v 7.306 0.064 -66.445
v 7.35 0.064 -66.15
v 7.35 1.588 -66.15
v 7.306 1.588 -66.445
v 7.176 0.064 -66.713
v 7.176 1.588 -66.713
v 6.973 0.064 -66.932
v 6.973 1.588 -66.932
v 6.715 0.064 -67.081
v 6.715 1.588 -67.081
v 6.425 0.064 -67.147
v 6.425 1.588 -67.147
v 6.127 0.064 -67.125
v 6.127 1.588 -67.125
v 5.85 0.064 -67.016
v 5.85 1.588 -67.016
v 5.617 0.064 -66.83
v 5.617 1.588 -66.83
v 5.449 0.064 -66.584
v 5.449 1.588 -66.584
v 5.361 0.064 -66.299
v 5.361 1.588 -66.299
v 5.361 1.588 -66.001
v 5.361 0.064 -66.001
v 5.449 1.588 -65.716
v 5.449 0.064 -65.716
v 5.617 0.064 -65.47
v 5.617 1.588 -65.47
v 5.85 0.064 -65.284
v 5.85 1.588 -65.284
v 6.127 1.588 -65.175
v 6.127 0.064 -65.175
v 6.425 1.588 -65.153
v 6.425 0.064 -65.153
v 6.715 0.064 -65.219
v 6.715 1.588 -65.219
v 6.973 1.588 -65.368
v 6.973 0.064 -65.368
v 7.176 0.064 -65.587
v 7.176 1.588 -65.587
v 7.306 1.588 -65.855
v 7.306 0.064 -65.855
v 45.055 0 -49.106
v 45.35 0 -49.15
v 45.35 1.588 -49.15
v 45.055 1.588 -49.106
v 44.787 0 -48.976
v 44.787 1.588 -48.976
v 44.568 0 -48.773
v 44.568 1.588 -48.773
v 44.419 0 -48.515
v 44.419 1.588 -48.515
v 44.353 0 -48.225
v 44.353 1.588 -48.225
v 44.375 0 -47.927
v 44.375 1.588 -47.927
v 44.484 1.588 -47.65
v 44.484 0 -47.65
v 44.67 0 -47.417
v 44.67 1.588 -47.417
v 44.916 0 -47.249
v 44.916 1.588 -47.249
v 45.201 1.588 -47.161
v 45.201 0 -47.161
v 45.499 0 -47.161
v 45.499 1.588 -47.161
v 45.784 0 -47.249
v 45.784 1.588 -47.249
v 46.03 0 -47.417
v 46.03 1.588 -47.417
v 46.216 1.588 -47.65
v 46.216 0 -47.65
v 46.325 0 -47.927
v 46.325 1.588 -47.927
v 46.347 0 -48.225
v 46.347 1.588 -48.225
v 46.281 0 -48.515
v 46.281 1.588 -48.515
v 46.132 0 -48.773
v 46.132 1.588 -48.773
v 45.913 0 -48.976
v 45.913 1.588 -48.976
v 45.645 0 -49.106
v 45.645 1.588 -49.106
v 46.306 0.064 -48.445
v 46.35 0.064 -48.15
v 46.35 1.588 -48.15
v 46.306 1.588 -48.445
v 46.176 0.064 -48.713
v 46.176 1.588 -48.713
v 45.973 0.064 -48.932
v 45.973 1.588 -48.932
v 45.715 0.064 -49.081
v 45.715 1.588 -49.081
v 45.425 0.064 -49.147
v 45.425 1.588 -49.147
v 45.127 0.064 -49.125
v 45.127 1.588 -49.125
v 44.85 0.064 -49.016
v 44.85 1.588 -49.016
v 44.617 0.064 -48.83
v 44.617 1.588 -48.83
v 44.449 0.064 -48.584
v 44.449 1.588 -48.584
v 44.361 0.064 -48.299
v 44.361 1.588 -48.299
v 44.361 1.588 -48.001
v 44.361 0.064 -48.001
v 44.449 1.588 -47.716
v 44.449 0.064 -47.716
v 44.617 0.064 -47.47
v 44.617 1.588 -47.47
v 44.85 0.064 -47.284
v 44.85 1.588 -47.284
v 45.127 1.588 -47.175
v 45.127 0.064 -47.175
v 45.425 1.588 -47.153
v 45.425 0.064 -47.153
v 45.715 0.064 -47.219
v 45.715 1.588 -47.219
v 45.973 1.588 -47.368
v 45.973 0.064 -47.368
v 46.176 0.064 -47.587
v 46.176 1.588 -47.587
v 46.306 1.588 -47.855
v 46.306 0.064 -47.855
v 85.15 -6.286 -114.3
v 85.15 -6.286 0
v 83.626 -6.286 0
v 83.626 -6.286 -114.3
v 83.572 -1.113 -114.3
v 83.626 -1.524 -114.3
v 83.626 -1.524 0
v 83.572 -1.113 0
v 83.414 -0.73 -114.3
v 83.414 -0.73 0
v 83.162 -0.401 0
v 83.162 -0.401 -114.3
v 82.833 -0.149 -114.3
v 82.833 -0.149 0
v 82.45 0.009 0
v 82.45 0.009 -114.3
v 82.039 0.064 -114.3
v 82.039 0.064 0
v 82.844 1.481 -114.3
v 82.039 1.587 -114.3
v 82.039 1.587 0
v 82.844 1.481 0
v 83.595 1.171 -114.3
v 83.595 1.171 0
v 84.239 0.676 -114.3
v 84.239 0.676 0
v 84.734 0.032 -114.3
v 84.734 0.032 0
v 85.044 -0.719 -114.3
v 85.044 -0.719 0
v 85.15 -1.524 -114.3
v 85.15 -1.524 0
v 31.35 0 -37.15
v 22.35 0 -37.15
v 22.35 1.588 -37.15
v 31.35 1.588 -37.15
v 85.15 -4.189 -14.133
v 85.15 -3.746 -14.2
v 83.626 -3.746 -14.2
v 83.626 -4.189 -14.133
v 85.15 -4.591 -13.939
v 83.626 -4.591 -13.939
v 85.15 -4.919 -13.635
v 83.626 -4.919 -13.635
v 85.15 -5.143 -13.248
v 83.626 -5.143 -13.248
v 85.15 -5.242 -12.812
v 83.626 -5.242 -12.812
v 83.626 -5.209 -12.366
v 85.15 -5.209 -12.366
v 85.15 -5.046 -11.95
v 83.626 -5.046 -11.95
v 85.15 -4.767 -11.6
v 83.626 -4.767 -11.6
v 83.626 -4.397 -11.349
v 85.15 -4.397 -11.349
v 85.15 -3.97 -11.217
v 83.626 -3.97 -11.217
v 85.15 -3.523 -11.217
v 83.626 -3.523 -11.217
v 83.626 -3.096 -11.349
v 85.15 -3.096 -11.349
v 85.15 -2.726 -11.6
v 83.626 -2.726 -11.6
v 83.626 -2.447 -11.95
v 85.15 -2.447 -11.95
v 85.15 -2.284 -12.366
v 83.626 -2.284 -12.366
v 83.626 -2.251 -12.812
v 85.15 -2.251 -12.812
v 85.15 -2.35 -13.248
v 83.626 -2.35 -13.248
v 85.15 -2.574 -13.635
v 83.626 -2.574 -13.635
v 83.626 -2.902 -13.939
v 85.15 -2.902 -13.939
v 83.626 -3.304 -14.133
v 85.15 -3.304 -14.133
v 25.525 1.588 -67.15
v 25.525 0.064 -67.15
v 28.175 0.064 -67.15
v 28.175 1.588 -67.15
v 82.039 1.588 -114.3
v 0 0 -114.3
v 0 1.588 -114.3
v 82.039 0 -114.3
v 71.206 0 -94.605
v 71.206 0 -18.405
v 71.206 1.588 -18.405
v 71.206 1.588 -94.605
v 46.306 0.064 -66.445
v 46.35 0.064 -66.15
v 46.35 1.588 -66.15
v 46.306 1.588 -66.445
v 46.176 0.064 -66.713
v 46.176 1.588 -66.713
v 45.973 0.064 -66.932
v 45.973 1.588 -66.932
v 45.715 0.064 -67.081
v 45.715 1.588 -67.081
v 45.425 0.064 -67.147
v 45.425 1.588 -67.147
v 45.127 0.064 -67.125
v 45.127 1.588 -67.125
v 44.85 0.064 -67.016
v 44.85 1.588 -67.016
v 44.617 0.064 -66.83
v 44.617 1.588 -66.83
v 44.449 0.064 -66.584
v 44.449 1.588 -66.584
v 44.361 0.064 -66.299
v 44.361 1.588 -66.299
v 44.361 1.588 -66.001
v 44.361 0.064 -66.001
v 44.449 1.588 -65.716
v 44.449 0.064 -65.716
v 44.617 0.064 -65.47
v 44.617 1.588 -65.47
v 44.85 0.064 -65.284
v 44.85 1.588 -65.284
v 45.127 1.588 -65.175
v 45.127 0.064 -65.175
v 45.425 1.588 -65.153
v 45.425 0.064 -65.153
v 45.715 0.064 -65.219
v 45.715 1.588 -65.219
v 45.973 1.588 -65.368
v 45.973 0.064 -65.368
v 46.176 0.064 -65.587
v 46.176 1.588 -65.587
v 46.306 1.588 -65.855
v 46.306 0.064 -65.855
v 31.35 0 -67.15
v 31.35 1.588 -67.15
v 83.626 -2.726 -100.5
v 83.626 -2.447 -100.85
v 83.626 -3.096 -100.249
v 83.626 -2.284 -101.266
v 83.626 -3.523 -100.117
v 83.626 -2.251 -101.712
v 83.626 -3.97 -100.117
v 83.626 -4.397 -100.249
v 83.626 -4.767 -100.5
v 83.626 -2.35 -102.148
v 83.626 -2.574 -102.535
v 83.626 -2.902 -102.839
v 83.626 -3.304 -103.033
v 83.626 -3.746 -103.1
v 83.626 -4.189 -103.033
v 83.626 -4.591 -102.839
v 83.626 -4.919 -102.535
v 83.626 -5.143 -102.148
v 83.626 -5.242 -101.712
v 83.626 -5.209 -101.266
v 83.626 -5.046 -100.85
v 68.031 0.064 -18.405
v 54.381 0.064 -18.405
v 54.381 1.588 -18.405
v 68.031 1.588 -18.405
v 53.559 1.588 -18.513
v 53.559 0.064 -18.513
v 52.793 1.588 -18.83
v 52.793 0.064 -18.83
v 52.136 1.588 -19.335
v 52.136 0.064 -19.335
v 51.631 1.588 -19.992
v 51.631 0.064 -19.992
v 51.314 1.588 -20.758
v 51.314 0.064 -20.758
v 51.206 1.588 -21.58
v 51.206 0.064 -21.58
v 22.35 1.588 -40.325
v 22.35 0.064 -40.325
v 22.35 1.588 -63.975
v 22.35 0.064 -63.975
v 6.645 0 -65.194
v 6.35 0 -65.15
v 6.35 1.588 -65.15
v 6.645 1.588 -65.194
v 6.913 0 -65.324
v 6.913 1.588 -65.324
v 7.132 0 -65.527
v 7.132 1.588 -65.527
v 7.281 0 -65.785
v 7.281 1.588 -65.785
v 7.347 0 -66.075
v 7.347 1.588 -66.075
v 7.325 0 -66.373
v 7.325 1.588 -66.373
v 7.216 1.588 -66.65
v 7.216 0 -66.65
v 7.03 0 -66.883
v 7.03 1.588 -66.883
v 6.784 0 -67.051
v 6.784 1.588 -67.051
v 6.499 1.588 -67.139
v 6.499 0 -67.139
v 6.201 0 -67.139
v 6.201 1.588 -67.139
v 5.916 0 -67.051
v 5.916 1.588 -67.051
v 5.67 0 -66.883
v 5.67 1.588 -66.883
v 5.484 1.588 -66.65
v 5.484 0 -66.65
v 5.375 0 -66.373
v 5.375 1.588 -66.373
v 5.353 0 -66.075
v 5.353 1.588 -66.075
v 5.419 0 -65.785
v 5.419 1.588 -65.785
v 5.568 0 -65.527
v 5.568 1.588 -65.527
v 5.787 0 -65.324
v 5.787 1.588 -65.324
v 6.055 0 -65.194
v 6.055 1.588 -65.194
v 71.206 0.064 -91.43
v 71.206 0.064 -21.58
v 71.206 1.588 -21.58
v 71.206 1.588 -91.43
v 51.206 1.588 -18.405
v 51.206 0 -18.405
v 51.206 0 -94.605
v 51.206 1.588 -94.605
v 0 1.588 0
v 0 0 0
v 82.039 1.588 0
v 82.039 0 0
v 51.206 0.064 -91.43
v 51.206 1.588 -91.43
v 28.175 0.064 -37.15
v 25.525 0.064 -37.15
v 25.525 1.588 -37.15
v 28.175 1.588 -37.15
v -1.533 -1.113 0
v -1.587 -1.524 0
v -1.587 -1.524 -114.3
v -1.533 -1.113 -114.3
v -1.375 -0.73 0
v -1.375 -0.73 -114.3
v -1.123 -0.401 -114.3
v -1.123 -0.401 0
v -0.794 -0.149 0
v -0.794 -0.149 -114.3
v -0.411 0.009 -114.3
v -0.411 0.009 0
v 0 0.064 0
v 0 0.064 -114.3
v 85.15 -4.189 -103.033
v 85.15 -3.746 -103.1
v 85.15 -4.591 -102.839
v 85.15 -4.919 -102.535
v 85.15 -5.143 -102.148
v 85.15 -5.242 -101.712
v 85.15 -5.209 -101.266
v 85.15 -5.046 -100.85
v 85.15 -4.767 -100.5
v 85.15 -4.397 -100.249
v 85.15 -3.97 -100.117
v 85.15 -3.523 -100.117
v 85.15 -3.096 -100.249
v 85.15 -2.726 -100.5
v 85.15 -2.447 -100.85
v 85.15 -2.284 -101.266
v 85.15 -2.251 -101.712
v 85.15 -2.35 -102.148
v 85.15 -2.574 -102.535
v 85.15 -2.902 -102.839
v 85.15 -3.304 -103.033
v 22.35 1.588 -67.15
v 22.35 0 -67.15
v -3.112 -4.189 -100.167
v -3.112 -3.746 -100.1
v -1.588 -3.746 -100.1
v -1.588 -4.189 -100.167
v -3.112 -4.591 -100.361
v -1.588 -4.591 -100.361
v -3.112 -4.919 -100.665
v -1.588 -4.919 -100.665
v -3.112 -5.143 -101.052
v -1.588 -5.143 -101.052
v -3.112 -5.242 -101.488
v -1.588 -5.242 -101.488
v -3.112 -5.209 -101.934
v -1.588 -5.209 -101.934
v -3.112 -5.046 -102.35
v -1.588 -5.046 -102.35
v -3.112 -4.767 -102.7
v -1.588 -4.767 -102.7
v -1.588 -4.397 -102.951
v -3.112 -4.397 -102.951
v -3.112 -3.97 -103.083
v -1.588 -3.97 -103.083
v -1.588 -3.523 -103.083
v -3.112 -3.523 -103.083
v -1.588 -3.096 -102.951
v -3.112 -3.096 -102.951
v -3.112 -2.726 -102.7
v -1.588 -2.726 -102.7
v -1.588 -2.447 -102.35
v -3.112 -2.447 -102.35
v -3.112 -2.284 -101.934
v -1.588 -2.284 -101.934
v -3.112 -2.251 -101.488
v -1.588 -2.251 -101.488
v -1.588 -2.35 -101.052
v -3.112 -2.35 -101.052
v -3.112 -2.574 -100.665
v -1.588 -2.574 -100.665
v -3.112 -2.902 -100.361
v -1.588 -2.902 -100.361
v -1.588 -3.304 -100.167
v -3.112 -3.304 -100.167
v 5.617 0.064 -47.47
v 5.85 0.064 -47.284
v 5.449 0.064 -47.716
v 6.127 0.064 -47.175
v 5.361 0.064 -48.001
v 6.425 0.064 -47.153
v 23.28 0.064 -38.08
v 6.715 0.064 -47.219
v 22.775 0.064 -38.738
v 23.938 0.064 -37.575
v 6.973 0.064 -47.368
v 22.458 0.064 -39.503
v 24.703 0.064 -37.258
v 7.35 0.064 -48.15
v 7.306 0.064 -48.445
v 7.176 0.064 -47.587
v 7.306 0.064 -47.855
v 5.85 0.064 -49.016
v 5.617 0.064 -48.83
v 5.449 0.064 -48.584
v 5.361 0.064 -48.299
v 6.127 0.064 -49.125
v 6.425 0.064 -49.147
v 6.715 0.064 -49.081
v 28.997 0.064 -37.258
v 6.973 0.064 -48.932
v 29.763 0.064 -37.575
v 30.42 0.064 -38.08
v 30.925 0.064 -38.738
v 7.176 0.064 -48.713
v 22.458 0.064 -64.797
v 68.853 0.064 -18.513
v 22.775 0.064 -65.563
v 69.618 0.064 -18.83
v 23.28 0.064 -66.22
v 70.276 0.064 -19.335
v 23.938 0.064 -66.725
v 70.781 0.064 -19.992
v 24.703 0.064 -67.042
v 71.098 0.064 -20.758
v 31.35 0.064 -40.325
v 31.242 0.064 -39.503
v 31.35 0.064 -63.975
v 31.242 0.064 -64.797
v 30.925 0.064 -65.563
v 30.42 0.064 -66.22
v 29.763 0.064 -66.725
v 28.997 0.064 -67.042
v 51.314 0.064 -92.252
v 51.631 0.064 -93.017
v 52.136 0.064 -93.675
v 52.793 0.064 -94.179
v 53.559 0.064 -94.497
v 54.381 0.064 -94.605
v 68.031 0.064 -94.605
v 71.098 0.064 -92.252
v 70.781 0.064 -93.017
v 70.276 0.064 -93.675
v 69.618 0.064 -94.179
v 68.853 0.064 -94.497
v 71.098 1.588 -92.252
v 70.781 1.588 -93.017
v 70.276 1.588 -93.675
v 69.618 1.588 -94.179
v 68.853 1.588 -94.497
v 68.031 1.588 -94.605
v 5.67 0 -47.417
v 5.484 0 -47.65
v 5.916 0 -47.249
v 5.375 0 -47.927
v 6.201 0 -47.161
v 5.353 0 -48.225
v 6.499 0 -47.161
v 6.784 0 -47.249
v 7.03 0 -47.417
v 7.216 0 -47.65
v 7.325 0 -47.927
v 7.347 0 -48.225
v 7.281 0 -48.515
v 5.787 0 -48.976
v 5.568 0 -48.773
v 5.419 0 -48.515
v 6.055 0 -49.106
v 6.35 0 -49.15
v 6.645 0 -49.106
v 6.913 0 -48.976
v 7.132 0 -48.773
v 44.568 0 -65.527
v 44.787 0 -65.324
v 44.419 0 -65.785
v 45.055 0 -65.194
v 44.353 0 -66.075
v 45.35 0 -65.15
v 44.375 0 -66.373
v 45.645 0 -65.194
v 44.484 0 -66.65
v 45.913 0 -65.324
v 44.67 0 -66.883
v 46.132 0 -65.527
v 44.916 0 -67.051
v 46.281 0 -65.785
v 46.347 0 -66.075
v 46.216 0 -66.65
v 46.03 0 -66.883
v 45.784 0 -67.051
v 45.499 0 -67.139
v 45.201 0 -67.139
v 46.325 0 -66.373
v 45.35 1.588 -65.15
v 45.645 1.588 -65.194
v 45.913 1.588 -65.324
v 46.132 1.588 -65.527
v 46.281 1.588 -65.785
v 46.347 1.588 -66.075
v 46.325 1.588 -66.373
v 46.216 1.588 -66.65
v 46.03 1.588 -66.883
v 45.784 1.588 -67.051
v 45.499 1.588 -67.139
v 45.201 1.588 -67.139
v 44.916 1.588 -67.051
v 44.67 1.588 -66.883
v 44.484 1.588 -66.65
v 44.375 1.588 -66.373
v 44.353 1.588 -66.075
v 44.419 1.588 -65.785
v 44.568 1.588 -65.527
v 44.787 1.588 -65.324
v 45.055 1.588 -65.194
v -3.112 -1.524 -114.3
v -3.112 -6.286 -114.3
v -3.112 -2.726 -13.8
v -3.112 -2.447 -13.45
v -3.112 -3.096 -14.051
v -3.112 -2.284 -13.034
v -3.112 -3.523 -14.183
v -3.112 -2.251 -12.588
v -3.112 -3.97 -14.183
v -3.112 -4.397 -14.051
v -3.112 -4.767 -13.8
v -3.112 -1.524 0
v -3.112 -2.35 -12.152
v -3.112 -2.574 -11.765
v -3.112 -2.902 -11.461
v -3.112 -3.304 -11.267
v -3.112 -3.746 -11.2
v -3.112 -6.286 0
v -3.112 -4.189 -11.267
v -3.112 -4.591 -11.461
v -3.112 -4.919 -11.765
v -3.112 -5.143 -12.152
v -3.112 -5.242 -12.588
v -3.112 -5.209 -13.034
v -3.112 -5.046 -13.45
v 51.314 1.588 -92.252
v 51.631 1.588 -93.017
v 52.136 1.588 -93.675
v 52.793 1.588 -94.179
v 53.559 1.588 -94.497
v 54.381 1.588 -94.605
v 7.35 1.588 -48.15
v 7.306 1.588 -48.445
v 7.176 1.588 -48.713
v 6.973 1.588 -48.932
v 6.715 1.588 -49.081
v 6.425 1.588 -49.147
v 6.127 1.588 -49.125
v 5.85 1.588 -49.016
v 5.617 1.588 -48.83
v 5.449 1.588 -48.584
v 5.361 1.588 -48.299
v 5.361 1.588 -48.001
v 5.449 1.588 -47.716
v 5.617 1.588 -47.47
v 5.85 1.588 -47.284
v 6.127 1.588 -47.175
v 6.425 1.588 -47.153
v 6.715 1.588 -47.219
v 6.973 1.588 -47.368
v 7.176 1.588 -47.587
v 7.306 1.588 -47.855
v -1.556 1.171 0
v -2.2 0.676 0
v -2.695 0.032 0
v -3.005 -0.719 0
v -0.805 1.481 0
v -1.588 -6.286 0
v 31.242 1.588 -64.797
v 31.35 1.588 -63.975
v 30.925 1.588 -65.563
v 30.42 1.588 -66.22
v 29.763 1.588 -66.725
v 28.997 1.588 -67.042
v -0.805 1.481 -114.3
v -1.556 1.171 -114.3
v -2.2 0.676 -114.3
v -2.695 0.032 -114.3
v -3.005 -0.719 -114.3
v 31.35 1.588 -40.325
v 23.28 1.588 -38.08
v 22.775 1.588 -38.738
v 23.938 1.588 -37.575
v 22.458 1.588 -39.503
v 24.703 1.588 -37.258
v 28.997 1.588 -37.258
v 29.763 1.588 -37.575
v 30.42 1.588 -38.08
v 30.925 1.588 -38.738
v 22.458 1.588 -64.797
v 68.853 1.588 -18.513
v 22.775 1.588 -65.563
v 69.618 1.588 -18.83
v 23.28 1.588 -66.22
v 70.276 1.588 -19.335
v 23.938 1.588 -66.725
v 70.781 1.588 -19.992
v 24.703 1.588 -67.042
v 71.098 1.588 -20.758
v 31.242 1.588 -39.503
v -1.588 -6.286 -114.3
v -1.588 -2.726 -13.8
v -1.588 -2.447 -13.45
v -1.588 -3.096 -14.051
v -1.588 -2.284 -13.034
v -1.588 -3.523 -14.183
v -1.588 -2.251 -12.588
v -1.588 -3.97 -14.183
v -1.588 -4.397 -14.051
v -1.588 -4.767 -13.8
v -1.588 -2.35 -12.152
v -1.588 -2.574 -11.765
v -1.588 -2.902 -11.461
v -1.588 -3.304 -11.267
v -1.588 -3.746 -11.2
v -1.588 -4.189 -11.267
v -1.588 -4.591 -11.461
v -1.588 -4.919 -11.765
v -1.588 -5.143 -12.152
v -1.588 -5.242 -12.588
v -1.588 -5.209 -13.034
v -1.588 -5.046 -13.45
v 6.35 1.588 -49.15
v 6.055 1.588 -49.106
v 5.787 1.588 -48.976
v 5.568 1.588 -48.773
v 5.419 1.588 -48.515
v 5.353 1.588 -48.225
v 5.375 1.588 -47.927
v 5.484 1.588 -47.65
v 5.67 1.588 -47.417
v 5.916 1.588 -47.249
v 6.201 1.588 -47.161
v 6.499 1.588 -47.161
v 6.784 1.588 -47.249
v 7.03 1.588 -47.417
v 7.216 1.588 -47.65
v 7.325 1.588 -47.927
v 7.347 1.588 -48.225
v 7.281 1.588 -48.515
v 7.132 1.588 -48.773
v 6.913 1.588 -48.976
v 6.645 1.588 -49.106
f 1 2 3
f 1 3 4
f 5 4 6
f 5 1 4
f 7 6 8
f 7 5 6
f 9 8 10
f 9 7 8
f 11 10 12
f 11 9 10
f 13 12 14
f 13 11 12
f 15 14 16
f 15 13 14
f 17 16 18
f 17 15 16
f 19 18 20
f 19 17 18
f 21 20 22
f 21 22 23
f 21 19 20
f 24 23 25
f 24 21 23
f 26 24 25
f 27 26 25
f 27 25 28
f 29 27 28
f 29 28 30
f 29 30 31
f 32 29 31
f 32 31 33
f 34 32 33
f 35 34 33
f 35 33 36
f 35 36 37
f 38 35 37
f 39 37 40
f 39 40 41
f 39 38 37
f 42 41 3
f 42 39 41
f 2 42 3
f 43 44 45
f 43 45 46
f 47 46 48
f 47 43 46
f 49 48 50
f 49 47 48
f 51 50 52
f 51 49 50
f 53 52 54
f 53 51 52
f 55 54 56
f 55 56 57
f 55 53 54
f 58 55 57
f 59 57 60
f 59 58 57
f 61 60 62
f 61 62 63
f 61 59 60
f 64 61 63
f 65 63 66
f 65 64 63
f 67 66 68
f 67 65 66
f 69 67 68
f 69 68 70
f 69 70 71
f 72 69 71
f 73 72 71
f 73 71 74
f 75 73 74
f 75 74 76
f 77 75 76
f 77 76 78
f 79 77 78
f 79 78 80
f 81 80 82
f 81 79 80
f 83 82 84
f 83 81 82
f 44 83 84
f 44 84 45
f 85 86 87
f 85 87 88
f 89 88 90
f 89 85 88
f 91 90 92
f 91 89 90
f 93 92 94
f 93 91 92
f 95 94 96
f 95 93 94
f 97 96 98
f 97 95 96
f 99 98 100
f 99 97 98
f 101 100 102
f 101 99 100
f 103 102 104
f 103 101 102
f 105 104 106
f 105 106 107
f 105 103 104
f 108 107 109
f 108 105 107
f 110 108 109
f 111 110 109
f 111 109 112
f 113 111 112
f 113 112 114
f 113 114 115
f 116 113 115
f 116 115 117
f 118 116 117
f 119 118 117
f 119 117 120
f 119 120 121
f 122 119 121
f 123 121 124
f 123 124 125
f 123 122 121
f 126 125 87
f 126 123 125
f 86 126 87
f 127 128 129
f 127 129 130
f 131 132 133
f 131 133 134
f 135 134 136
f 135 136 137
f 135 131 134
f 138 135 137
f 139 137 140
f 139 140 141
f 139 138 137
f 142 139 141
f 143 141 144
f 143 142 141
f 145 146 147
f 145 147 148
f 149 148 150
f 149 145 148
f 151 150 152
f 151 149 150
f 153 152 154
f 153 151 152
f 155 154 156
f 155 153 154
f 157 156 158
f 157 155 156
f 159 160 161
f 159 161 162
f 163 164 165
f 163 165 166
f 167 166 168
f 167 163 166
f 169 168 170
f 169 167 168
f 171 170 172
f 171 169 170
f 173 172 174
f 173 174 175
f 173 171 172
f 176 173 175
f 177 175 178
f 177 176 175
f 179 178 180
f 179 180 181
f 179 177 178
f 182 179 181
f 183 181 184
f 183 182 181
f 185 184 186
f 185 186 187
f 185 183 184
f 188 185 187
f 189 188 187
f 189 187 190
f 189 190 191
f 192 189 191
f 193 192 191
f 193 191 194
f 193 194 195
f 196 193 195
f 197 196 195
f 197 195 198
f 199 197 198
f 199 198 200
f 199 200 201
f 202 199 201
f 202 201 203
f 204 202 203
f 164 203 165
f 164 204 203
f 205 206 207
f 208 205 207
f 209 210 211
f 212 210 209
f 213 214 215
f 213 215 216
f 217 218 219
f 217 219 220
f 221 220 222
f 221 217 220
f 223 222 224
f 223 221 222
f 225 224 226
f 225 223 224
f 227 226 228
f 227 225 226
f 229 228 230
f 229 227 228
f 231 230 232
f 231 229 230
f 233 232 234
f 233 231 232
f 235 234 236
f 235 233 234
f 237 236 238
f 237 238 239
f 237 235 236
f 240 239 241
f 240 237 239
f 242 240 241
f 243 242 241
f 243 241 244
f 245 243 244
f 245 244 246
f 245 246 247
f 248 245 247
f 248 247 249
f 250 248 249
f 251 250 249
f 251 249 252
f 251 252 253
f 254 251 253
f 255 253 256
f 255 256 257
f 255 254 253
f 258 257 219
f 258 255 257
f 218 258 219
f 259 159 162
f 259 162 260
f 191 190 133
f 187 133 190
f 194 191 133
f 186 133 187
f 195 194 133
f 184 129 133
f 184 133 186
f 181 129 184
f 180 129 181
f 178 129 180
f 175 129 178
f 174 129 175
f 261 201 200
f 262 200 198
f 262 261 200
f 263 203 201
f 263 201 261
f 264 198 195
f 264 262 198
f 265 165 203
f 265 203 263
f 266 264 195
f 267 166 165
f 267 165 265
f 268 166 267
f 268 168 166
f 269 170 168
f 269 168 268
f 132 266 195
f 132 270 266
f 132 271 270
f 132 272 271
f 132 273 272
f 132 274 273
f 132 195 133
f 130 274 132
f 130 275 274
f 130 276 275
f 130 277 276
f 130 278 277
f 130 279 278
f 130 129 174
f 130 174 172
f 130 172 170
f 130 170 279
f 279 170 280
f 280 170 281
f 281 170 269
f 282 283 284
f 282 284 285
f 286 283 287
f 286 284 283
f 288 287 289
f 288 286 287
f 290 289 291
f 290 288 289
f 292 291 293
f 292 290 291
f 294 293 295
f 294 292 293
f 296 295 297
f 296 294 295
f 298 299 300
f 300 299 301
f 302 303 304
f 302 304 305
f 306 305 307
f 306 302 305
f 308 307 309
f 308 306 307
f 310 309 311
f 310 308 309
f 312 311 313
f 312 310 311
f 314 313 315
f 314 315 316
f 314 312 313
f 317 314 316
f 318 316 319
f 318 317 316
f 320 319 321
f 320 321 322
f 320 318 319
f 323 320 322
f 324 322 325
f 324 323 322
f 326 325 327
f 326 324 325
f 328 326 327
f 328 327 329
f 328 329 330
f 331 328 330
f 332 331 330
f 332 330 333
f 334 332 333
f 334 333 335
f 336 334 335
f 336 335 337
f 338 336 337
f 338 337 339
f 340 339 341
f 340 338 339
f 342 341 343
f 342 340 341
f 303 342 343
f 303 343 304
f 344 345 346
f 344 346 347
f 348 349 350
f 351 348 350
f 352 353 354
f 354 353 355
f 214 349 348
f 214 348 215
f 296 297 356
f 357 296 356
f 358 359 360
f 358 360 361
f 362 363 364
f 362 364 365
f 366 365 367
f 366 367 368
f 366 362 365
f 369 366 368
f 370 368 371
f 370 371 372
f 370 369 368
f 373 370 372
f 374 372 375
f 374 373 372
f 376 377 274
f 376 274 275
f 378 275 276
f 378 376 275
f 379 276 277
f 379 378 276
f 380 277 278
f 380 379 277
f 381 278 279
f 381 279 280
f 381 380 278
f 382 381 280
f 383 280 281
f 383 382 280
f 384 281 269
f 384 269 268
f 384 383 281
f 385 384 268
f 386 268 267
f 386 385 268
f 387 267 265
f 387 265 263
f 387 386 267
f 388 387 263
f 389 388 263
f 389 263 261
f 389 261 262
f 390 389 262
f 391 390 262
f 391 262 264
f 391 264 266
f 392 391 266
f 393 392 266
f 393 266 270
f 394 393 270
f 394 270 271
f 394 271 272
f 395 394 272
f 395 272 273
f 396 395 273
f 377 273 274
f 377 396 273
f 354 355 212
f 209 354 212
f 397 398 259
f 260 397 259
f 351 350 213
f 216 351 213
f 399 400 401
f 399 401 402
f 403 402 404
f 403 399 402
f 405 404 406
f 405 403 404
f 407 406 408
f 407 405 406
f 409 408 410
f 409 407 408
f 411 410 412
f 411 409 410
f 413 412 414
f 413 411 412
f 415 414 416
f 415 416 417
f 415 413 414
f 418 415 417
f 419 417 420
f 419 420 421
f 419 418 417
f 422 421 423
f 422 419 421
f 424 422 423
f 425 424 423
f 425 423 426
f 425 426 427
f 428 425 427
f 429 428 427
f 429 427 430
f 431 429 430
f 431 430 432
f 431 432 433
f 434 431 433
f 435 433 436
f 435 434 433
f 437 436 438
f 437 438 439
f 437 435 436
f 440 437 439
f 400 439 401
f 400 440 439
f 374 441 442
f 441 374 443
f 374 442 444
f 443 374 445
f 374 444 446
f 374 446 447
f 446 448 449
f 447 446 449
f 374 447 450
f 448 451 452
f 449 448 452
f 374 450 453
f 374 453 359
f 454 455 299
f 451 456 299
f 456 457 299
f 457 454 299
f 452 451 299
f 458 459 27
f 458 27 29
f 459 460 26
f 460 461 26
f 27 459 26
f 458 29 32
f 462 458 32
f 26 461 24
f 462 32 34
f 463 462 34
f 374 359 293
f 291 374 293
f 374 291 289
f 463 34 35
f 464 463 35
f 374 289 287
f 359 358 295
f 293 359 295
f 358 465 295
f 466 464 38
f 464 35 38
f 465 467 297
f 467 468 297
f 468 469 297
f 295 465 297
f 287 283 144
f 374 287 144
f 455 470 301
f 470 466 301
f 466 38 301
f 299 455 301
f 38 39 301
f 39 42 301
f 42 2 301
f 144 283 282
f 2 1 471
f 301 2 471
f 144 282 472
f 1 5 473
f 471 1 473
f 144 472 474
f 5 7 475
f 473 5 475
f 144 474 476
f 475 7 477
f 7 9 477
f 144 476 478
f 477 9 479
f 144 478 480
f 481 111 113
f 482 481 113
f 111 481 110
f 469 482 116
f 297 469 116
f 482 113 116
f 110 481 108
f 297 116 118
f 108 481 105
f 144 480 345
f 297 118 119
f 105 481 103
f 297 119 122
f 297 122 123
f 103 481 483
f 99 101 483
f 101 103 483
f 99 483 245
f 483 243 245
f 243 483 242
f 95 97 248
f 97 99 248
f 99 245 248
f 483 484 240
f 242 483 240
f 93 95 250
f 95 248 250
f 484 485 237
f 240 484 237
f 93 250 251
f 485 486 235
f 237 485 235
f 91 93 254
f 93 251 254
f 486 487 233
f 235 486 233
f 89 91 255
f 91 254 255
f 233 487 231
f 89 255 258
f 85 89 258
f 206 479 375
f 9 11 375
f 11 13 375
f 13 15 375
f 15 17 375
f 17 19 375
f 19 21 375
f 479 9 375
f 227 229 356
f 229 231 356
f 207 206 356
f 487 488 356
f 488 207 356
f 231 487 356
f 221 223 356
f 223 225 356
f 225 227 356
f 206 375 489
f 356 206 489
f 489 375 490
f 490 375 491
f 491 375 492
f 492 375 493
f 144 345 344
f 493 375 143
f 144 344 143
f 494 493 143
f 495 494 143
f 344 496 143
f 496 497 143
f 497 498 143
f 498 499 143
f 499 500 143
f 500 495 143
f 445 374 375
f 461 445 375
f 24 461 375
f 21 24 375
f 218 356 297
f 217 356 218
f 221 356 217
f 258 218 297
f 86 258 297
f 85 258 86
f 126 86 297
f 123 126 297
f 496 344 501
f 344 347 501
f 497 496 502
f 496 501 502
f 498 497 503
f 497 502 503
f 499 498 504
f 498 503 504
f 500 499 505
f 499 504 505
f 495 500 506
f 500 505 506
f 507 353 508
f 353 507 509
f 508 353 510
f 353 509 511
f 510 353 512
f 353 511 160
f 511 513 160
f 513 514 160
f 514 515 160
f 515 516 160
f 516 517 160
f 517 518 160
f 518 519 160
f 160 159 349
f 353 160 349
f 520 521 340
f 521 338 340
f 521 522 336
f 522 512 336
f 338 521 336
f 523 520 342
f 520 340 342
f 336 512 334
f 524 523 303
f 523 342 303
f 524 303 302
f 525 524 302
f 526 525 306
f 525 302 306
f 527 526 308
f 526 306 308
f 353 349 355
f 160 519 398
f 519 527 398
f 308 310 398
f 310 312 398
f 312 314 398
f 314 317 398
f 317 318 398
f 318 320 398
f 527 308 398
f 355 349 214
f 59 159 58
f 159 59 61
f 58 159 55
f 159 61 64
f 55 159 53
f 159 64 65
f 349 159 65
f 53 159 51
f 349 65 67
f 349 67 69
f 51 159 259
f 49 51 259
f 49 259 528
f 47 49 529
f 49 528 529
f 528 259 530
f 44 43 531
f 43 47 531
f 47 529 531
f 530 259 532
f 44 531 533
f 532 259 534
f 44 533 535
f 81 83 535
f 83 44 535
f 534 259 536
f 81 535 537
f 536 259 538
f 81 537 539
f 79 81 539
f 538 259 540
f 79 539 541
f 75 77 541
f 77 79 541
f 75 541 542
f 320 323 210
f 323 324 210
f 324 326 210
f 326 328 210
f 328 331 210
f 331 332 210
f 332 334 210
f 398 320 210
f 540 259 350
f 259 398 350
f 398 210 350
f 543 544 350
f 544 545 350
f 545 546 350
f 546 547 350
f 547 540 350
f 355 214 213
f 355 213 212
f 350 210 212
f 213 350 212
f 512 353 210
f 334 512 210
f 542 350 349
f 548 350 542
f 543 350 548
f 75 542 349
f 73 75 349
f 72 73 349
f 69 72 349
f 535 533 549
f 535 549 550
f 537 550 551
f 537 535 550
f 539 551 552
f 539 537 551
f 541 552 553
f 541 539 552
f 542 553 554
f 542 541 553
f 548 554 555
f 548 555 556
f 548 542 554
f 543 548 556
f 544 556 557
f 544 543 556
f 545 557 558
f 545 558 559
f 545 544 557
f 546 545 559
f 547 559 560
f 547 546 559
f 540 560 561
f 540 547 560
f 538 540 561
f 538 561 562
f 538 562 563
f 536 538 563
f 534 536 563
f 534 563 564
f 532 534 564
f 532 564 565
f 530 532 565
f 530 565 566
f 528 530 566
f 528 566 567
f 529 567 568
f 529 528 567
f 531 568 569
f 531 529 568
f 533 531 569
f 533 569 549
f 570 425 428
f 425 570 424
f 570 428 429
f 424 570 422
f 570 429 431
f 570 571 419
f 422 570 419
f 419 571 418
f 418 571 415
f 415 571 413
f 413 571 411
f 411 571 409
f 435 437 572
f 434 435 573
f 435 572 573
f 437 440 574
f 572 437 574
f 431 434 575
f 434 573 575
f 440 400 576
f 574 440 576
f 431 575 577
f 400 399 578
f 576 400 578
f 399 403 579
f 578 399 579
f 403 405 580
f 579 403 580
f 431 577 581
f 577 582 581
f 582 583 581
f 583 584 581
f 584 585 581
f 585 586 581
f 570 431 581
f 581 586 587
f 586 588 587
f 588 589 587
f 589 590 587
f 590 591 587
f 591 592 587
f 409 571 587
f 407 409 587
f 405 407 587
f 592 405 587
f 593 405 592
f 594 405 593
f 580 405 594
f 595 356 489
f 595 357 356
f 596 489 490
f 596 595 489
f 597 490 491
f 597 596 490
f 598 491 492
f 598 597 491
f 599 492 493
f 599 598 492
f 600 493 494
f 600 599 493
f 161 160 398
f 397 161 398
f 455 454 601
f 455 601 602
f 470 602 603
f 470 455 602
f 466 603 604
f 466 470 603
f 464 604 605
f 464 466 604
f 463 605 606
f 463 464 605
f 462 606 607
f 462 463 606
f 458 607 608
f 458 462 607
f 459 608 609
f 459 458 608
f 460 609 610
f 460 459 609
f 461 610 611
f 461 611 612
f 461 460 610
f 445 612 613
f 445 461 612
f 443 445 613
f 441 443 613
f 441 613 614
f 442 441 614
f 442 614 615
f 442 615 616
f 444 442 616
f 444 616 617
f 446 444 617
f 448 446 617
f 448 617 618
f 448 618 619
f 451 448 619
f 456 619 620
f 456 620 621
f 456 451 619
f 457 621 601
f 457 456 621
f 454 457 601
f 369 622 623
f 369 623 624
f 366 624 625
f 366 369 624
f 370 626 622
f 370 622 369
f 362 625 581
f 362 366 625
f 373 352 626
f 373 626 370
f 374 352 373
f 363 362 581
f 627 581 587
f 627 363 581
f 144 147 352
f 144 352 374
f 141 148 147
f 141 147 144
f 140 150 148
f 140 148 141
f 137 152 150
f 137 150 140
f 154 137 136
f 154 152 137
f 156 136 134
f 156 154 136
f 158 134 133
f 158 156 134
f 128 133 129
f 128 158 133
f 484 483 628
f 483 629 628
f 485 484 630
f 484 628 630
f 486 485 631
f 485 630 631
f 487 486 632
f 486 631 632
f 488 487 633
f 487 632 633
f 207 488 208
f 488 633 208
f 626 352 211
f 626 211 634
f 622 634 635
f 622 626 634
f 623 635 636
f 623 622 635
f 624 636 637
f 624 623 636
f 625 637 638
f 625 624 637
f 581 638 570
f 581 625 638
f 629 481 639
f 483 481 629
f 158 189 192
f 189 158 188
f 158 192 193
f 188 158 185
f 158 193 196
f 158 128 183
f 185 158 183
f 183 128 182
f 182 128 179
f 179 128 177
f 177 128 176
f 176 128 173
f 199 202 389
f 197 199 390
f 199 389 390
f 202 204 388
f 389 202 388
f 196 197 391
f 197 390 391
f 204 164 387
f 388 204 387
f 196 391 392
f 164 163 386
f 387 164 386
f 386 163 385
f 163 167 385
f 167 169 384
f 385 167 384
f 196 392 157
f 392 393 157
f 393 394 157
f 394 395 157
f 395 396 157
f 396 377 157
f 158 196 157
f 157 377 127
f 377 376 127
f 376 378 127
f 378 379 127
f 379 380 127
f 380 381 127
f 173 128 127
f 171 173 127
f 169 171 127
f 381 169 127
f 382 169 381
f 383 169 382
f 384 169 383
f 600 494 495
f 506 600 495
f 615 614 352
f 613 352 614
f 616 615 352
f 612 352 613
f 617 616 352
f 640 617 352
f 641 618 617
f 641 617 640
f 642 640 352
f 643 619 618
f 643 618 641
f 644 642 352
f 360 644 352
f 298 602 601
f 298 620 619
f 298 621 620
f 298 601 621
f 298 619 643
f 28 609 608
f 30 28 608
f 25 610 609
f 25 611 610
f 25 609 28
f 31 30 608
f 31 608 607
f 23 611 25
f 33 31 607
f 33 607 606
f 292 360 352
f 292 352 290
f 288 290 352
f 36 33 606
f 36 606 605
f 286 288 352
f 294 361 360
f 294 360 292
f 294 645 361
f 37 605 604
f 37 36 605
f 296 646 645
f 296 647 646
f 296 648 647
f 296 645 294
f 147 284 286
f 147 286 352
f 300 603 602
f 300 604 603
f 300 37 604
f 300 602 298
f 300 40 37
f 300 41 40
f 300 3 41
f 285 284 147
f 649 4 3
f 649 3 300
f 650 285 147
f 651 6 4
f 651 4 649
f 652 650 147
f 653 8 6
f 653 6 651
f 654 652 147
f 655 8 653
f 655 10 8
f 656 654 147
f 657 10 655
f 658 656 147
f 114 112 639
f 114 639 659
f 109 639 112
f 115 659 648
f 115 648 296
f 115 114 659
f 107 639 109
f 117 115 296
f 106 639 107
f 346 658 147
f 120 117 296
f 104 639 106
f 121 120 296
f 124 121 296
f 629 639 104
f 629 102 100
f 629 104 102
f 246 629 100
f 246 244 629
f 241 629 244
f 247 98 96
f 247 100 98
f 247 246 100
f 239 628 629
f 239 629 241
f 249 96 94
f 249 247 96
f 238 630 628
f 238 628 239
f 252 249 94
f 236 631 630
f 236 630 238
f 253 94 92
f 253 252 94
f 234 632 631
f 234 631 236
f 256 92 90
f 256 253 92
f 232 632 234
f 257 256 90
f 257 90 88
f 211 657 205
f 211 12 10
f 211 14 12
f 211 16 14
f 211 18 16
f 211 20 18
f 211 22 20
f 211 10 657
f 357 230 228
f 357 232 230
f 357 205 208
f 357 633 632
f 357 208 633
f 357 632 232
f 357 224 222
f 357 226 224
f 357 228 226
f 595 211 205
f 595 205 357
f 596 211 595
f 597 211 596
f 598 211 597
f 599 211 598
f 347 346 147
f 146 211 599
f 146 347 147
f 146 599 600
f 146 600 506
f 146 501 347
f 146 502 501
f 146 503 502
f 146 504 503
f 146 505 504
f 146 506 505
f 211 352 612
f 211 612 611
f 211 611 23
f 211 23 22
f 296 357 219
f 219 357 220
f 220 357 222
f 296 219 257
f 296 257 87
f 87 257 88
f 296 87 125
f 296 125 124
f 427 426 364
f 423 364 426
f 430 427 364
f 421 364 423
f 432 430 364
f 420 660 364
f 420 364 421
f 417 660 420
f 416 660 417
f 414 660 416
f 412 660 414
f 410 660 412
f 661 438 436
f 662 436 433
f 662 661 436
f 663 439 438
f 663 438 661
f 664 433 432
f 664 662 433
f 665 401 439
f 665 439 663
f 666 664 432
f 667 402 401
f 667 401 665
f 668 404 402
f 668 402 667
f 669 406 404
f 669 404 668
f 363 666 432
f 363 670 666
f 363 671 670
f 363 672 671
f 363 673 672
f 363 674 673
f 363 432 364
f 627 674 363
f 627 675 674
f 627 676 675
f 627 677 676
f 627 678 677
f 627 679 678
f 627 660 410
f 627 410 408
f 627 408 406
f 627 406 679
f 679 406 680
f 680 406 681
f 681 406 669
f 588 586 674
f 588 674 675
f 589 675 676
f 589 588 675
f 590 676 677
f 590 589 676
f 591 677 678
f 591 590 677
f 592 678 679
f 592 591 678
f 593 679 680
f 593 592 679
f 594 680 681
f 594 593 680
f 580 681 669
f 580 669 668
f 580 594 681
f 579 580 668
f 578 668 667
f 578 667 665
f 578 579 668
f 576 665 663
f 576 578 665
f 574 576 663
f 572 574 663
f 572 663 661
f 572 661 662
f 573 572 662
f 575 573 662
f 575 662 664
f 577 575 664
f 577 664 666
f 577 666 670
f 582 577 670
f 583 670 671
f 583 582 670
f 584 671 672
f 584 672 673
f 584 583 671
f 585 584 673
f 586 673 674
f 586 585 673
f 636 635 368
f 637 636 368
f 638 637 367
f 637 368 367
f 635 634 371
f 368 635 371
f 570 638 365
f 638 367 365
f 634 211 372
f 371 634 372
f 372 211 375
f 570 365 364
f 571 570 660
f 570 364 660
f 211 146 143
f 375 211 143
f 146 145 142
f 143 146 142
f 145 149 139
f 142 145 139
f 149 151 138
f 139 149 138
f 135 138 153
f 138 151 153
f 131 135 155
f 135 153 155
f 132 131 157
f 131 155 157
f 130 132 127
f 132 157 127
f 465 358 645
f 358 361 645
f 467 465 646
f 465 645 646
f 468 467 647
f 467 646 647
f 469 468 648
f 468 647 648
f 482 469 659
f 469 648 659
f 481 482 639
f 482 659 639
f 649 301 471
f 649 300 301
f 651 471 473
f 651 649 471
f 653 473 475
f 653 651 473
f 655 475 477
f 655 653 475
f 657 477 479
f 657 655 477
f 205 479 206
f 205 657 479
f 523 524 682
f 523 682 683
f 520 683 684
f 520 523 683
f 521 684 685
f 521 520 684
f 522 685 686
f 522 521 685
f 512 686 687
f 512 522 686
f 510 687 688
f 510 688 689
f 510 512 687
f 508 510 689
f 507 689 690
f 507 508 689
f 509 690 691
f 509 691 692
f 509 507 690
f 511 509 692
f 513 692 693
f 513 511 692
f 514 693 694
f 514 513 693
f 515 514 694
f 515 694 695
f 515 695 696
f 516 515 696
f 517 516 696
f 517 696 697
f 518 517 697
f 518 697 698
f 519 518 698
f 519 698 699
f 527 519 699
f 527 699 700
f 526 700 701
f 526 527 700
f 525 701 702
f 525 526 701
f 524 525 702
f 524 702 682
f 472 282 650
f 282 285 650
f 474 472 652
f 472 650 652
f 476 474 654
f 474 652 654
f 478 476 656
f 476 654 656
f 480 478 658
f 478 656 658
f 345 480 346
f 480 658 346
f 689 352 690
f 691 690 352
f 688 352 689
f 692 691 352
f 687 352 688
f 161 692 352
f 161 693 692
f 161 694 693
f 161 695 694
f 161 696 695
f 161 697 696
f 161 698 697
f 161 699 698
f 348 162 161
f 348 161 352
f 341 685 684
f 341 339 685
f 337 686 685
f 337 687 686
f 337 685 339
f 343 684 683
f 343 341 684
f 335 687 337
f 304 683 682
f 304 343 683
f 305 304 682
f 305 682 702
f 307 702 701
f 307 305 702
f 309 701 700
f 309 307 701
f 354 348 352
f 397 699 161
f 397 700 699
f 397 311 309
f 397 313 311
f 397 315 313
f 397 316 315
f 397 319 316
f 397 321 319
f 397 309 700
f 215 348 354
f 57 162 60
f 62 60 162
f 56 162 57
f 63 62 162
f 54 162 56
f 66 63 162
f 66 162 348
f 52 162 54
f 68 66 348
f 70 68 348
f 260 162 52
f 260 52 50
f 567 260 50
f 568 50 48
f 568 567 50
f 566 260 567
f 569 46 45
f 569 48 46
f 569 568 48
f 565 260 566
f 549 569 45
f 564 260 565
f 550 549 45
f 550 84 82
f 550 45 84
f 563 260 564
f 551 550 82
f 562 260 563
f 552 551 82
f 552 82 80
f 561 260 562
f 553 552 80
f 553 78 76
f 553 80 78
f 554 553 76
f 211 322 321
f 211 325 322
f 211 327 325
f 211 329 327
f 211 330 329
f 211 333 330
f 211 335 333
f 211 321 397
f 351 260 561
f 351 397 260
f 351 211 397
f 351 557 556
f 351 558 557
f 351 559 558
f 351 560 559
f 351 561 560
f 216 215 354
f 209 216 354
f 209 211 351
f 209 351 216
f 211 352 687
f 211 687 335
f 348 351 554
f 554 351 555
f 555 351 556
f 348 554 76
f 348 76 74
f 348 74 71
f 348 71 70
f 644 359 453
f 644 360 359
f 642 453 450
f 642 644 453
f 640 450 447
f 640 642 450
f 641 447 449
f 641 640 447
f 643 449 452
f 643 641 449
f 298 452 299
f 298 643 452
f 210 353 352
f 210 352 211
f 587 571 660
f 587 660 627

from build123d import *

# Parameters (mm, degrees)
ESQUISSE1_W                      = 82.039
ESQUISSE1_H                      = 114.3
ESQUISSE1_R                      = 1
ESQUISSE1_W_2                    = 20
ESQUISSE1_H_2                    = 76.2
ESQUISSE1_W_3                    = 9
ESQUISSE1_H_3                    = 30
BOSS_EXTRU_1_DEPTH               = 1.5875
CONVERTIR_VOLUME1_START          = 0.0635
CONVERTIR_VOLUME1_OUTLINE_W      = 82.039
CONVERTIR_VOLUME1_OUTLINE_H      = 114.3
CONVERTIR_VOLUME1_OUTLINE_R      = 1
CONVERTIR_VOLUME1_OUTLINE_W_2    = 9
CONVERTIR_VOLUME1_OUTLINE_H_2    = 30
CONVERTIR_VOLUME1_OUTLINE_W_3    = 20
CONVERTIR_VOLUME1_OUTLINE_H_3    = 76.2
CONVERTIR_VOLUME1_DEPTH          = 1.524
T_LE_PLI_E_SUR_AR_TE1_DEPTH      = 114.3
T_LE_START                       = -1.524
T_LE_PLI_E_SUR_AR_TE1_PROFILE_W  = 114.3
T_LE_PLI_E_SUR_AR_TE1_PROFILE_H  = 4.7625
T_LE_PLI_E_SUR_AR_TE1_PROFILE_R  = 1.5
T_LE_PLI_E_SUR_AR_TE1_FLAT_DEPTH = 1.524
T_LE_PLI_E_SUR_AR_TE4_DEPTH      = 114.3
T_LE_PLI_E_SUR_AR_TE4_PROFILE_W  = 114.3
T_LE_PLI_E_SUR_AR_TE4_PROFILE_H  = 4.7625
T_LE_PLI_E_SUR_AR_TE4_PROFILE_R  = 1.5
T_LE_PLI_E_SUR_AR_TE4_FLAT_DEPTH = 1.524
CONG_1_R                         = 3.175


with BuildPart() as part:
    # Esquisse1 → Boss.-Extru.1 (new body)
    with BuildSketch(Plane(origin=(0, 0, 0), x_dir=(1, 0, 0), z_dir=(0, 1, 0))):
        with Locations((41.0195, 57.15)):
            Rectangle(ESQUISSE1_W, ESQUISSE1_H)
        with Locations(Location((6.35, 66.15, 0), (0, 0, 270))):
            Circle(ESQUISSE1_R, mode=Mode.SUBTRACT)
        with Locations(Location((45.35, 66.15, 0), (0, 0, 270))):
            Circle(ESQUISSE1_R, mode=Mode.SUBTRACT)
        with Locations(Location((45.35, 48.15, 0), (0, 0, 90))):
            Circle(ESQUISSE1_R, mode=Mode.SUBTRACT)
        with Locations(Location((6.35, 48.15, 0), (0, 0, 90))):
            Circle(ESQUISSE1_R, mode=Mode.SUBTRACT)
        with Locations((61.205916091, 56.504752132)):
            Rectangle(ESQUISSE1_W_2, ESQUISSE1_H_2, mode=Mode.SUBTRACT)
        with Locations((26.85, 52.15)):
            Rectangle(ESQUISSE1_W_3, ESQUISSE1_H_3, mode=Mode.SUBTRACT)
    extrude(amount=BOSS_EXTRU_1_DEPTH)


with BuildPart() as body_2:
    # Convertir-Volume1: read off the stored shape, not the designer's step
    # Convertir-Volume1 outline → Convertir-Volume1 (new body)
    with BuildSketch(Plane(origin=(0, 0, 0), x_dir=(1, 0, 0), z_dir=(0, 1, 0)).offset(CONVERTIR_VOLUME1_START)):
        with Locations((41.0195, 57.15)):
            Rectangle(CONVERTIR_VOLUME1_OUTLINE_W, CONVERTIR_VOLUME1_OUTLINE_H)
        with Locations((6.35, 48.15)):
            Circle(CONVERTIR_VOLUME1_OUTLINE_R, mode=Mode.SUBTRACT)
        with Locations((26.85, 52.15)):
            Rectangle(CONVERTIR_VOLUME1_OUTLINE_W_2, CONVERTIR_VOLUME1_OUTLINE_H_2, mode=Mode.SUBTRACT)
        with Locations((45.35, 48.15)):
            Circle(CONVERTIR_VOLUME1_OUTLINE_R, mode=Mode.SUBTRACT)
        with Locations((61.205916091, 56.504752132)):
            Rectangle(CONVERTIR_VOLUME1_OUTLINE_W_3, CONVERTIR_VOLUME1_OUTLINE_H_3, mode=Mode.SUBTRACT)
        with Locations((6.35, 66.15)):
            Circle(CONVERTIR_VOLUME1_OUTLINE_R, mode=Mode.SUBTRACT)
        with Locations((45.35, 66.15)):
            Circle(CONVERTIR_VOLUME1_OUTLINE_R, mode=Mode.SUBTRACT)
    extrude(amount=CONVERTIR_VOLUME1_DEPTH)

    # Tôle pliée sur arête1: sheet metal written as solids
    # Tôle pliée sur arête1 bend section (on a plane across the edge) → Tôle pliée sur arête1 (add)
    with BuildSketch(Plane(origin=(-1.5875, 0.0635, 0), x_dir=(1, 0, 0), z_dir=(0, 0, -1))):
        with BuildLine():
            Line((-1.524, 1.5875), (0, 1.5875))
            ThreePointArc((0, 1.5875), (0.464967985, 0.464967985), (1.5875, 0))
            Line((1.5875, 0), (1.5875, -1.524))
            ThreePointArc((1.5875, -1.524), (-0.61266275, -0.61266275), (-1.524, 1.5875))
        make_face()
    extrude(amount=T_LE_PLI_E_SUR_AR_TE1_DEPTH)

    # Tôle pliée sur arête1 profile (on flange) → Tôle pliée sur arête1 flat (add)
    with BuildSketch(Plane(origin=(-1.5875, 0.0635, 0), x_dir=(0, 0, 1), z_dir=(1, 0, 0)).offset(T_LE_START)):
        with Locations((-57.15, 3.96875)):
            Rectangle(T_LE_PLI_E_SUR_AR_TE1_PROFILE_W, T_LE_PLI_E_SUR_AR_TE1_PROFILE_H)
        with Locations((-12.7, 3.81)):
            Circle(T_LE_PLI_E_SUR_AR_TE1_PROFILE_R, mode=Mode.SUBTRACT)
        with Locations((-101.6, 3.81)):
            Circle(T_LE_PLI_E_SUR_AR_TE1_PROFILE_R, mode=Mode.SUBTRACT)
    extrude(amount=T_LE_PLI_E_SUR_AR_TE1_FLAT_DEPTH)

    # Tôle pliée sur arête4: sheet metal written as solids
    # Tôle pliée sur arête4 bend section (on a plane across the edge) → Tôle pliée sur arête4 (add)
    with BuildSketch(Plane(origin=(83.6265, 0.0635, -114.3), x_dir=(-1, 0, 0), z_dir=(0, 0, 1))):
        with BuildLine():
            Line((-1.524, 1.5875), (0, 1.5875))
            ThreePointArc((0, 1.5875), (0.464967985, 0.464967985), (1.5875, 0))
            Line((1.5875, 0), (1.5875, -1.524))
            ThreePointArc((1.5875, -1.524), (-0.61266275, -0.61266275), (-1.524, 1.5875))
        make_face()
    extrude(amount=T_LE_PLI_E_SUR_AR_TE4_DEPTH)

    # Tôle pliée sur arête4 profile (on flange) → Tôle pliée sur arête4 flat (add)
    with BuildSketch(Plane(origin=(83.6265, 0.0635, 0), x_dir=(0, 0, -1), z_dir=(-1, 0, 0)).offset(T_LE_START)):
        with Locations((57.15, 3.96875)):
            Rectangle(T_LE_PLI_E_SUR_AR_TE4_PROFILE_W, T_LE_PLI_E_SUR_AR_TE4_PROFILE_H)
        with Locations((12.7, 3.81)):
            Circle(T_LE_PLI_E_SUR_AR_TE4_PROFILE_R, mode=Mode.SUBTRACT)
        with Locations((101.6, 3.81)):
            Circle(T_LE_PLI_E_SUR_AR_TE4_PROFILE_R, mode=Mode.SUBTRACT)
    extrude(amount=T_LE_PLI_E_SUR_AR_TE4_FLAT_DEPTH)

    # Congé1
    cong_1_edges = [body_2.edges().sort_by_distance(p)[0] for p in [
        (51.205916091, 0.8255, -94.604752132),
        (51.205916091, 0.8255, -18.404752132),
        (71.205916091, 0.8255, -18.404752132),
        (71.205916091, 0.8255, -94.604752132),
        (22.35, 0.8255, -67.15),
        (22.35, 0.8255, -37.15),
        (31.35, 0.8255, -37.15),
        (31.35, 0.8255, -67.15),
    ]]
    fillet(cong_1_edges, radius=CONG_1_R)


solid = Compound([part.part, body_2.part])
